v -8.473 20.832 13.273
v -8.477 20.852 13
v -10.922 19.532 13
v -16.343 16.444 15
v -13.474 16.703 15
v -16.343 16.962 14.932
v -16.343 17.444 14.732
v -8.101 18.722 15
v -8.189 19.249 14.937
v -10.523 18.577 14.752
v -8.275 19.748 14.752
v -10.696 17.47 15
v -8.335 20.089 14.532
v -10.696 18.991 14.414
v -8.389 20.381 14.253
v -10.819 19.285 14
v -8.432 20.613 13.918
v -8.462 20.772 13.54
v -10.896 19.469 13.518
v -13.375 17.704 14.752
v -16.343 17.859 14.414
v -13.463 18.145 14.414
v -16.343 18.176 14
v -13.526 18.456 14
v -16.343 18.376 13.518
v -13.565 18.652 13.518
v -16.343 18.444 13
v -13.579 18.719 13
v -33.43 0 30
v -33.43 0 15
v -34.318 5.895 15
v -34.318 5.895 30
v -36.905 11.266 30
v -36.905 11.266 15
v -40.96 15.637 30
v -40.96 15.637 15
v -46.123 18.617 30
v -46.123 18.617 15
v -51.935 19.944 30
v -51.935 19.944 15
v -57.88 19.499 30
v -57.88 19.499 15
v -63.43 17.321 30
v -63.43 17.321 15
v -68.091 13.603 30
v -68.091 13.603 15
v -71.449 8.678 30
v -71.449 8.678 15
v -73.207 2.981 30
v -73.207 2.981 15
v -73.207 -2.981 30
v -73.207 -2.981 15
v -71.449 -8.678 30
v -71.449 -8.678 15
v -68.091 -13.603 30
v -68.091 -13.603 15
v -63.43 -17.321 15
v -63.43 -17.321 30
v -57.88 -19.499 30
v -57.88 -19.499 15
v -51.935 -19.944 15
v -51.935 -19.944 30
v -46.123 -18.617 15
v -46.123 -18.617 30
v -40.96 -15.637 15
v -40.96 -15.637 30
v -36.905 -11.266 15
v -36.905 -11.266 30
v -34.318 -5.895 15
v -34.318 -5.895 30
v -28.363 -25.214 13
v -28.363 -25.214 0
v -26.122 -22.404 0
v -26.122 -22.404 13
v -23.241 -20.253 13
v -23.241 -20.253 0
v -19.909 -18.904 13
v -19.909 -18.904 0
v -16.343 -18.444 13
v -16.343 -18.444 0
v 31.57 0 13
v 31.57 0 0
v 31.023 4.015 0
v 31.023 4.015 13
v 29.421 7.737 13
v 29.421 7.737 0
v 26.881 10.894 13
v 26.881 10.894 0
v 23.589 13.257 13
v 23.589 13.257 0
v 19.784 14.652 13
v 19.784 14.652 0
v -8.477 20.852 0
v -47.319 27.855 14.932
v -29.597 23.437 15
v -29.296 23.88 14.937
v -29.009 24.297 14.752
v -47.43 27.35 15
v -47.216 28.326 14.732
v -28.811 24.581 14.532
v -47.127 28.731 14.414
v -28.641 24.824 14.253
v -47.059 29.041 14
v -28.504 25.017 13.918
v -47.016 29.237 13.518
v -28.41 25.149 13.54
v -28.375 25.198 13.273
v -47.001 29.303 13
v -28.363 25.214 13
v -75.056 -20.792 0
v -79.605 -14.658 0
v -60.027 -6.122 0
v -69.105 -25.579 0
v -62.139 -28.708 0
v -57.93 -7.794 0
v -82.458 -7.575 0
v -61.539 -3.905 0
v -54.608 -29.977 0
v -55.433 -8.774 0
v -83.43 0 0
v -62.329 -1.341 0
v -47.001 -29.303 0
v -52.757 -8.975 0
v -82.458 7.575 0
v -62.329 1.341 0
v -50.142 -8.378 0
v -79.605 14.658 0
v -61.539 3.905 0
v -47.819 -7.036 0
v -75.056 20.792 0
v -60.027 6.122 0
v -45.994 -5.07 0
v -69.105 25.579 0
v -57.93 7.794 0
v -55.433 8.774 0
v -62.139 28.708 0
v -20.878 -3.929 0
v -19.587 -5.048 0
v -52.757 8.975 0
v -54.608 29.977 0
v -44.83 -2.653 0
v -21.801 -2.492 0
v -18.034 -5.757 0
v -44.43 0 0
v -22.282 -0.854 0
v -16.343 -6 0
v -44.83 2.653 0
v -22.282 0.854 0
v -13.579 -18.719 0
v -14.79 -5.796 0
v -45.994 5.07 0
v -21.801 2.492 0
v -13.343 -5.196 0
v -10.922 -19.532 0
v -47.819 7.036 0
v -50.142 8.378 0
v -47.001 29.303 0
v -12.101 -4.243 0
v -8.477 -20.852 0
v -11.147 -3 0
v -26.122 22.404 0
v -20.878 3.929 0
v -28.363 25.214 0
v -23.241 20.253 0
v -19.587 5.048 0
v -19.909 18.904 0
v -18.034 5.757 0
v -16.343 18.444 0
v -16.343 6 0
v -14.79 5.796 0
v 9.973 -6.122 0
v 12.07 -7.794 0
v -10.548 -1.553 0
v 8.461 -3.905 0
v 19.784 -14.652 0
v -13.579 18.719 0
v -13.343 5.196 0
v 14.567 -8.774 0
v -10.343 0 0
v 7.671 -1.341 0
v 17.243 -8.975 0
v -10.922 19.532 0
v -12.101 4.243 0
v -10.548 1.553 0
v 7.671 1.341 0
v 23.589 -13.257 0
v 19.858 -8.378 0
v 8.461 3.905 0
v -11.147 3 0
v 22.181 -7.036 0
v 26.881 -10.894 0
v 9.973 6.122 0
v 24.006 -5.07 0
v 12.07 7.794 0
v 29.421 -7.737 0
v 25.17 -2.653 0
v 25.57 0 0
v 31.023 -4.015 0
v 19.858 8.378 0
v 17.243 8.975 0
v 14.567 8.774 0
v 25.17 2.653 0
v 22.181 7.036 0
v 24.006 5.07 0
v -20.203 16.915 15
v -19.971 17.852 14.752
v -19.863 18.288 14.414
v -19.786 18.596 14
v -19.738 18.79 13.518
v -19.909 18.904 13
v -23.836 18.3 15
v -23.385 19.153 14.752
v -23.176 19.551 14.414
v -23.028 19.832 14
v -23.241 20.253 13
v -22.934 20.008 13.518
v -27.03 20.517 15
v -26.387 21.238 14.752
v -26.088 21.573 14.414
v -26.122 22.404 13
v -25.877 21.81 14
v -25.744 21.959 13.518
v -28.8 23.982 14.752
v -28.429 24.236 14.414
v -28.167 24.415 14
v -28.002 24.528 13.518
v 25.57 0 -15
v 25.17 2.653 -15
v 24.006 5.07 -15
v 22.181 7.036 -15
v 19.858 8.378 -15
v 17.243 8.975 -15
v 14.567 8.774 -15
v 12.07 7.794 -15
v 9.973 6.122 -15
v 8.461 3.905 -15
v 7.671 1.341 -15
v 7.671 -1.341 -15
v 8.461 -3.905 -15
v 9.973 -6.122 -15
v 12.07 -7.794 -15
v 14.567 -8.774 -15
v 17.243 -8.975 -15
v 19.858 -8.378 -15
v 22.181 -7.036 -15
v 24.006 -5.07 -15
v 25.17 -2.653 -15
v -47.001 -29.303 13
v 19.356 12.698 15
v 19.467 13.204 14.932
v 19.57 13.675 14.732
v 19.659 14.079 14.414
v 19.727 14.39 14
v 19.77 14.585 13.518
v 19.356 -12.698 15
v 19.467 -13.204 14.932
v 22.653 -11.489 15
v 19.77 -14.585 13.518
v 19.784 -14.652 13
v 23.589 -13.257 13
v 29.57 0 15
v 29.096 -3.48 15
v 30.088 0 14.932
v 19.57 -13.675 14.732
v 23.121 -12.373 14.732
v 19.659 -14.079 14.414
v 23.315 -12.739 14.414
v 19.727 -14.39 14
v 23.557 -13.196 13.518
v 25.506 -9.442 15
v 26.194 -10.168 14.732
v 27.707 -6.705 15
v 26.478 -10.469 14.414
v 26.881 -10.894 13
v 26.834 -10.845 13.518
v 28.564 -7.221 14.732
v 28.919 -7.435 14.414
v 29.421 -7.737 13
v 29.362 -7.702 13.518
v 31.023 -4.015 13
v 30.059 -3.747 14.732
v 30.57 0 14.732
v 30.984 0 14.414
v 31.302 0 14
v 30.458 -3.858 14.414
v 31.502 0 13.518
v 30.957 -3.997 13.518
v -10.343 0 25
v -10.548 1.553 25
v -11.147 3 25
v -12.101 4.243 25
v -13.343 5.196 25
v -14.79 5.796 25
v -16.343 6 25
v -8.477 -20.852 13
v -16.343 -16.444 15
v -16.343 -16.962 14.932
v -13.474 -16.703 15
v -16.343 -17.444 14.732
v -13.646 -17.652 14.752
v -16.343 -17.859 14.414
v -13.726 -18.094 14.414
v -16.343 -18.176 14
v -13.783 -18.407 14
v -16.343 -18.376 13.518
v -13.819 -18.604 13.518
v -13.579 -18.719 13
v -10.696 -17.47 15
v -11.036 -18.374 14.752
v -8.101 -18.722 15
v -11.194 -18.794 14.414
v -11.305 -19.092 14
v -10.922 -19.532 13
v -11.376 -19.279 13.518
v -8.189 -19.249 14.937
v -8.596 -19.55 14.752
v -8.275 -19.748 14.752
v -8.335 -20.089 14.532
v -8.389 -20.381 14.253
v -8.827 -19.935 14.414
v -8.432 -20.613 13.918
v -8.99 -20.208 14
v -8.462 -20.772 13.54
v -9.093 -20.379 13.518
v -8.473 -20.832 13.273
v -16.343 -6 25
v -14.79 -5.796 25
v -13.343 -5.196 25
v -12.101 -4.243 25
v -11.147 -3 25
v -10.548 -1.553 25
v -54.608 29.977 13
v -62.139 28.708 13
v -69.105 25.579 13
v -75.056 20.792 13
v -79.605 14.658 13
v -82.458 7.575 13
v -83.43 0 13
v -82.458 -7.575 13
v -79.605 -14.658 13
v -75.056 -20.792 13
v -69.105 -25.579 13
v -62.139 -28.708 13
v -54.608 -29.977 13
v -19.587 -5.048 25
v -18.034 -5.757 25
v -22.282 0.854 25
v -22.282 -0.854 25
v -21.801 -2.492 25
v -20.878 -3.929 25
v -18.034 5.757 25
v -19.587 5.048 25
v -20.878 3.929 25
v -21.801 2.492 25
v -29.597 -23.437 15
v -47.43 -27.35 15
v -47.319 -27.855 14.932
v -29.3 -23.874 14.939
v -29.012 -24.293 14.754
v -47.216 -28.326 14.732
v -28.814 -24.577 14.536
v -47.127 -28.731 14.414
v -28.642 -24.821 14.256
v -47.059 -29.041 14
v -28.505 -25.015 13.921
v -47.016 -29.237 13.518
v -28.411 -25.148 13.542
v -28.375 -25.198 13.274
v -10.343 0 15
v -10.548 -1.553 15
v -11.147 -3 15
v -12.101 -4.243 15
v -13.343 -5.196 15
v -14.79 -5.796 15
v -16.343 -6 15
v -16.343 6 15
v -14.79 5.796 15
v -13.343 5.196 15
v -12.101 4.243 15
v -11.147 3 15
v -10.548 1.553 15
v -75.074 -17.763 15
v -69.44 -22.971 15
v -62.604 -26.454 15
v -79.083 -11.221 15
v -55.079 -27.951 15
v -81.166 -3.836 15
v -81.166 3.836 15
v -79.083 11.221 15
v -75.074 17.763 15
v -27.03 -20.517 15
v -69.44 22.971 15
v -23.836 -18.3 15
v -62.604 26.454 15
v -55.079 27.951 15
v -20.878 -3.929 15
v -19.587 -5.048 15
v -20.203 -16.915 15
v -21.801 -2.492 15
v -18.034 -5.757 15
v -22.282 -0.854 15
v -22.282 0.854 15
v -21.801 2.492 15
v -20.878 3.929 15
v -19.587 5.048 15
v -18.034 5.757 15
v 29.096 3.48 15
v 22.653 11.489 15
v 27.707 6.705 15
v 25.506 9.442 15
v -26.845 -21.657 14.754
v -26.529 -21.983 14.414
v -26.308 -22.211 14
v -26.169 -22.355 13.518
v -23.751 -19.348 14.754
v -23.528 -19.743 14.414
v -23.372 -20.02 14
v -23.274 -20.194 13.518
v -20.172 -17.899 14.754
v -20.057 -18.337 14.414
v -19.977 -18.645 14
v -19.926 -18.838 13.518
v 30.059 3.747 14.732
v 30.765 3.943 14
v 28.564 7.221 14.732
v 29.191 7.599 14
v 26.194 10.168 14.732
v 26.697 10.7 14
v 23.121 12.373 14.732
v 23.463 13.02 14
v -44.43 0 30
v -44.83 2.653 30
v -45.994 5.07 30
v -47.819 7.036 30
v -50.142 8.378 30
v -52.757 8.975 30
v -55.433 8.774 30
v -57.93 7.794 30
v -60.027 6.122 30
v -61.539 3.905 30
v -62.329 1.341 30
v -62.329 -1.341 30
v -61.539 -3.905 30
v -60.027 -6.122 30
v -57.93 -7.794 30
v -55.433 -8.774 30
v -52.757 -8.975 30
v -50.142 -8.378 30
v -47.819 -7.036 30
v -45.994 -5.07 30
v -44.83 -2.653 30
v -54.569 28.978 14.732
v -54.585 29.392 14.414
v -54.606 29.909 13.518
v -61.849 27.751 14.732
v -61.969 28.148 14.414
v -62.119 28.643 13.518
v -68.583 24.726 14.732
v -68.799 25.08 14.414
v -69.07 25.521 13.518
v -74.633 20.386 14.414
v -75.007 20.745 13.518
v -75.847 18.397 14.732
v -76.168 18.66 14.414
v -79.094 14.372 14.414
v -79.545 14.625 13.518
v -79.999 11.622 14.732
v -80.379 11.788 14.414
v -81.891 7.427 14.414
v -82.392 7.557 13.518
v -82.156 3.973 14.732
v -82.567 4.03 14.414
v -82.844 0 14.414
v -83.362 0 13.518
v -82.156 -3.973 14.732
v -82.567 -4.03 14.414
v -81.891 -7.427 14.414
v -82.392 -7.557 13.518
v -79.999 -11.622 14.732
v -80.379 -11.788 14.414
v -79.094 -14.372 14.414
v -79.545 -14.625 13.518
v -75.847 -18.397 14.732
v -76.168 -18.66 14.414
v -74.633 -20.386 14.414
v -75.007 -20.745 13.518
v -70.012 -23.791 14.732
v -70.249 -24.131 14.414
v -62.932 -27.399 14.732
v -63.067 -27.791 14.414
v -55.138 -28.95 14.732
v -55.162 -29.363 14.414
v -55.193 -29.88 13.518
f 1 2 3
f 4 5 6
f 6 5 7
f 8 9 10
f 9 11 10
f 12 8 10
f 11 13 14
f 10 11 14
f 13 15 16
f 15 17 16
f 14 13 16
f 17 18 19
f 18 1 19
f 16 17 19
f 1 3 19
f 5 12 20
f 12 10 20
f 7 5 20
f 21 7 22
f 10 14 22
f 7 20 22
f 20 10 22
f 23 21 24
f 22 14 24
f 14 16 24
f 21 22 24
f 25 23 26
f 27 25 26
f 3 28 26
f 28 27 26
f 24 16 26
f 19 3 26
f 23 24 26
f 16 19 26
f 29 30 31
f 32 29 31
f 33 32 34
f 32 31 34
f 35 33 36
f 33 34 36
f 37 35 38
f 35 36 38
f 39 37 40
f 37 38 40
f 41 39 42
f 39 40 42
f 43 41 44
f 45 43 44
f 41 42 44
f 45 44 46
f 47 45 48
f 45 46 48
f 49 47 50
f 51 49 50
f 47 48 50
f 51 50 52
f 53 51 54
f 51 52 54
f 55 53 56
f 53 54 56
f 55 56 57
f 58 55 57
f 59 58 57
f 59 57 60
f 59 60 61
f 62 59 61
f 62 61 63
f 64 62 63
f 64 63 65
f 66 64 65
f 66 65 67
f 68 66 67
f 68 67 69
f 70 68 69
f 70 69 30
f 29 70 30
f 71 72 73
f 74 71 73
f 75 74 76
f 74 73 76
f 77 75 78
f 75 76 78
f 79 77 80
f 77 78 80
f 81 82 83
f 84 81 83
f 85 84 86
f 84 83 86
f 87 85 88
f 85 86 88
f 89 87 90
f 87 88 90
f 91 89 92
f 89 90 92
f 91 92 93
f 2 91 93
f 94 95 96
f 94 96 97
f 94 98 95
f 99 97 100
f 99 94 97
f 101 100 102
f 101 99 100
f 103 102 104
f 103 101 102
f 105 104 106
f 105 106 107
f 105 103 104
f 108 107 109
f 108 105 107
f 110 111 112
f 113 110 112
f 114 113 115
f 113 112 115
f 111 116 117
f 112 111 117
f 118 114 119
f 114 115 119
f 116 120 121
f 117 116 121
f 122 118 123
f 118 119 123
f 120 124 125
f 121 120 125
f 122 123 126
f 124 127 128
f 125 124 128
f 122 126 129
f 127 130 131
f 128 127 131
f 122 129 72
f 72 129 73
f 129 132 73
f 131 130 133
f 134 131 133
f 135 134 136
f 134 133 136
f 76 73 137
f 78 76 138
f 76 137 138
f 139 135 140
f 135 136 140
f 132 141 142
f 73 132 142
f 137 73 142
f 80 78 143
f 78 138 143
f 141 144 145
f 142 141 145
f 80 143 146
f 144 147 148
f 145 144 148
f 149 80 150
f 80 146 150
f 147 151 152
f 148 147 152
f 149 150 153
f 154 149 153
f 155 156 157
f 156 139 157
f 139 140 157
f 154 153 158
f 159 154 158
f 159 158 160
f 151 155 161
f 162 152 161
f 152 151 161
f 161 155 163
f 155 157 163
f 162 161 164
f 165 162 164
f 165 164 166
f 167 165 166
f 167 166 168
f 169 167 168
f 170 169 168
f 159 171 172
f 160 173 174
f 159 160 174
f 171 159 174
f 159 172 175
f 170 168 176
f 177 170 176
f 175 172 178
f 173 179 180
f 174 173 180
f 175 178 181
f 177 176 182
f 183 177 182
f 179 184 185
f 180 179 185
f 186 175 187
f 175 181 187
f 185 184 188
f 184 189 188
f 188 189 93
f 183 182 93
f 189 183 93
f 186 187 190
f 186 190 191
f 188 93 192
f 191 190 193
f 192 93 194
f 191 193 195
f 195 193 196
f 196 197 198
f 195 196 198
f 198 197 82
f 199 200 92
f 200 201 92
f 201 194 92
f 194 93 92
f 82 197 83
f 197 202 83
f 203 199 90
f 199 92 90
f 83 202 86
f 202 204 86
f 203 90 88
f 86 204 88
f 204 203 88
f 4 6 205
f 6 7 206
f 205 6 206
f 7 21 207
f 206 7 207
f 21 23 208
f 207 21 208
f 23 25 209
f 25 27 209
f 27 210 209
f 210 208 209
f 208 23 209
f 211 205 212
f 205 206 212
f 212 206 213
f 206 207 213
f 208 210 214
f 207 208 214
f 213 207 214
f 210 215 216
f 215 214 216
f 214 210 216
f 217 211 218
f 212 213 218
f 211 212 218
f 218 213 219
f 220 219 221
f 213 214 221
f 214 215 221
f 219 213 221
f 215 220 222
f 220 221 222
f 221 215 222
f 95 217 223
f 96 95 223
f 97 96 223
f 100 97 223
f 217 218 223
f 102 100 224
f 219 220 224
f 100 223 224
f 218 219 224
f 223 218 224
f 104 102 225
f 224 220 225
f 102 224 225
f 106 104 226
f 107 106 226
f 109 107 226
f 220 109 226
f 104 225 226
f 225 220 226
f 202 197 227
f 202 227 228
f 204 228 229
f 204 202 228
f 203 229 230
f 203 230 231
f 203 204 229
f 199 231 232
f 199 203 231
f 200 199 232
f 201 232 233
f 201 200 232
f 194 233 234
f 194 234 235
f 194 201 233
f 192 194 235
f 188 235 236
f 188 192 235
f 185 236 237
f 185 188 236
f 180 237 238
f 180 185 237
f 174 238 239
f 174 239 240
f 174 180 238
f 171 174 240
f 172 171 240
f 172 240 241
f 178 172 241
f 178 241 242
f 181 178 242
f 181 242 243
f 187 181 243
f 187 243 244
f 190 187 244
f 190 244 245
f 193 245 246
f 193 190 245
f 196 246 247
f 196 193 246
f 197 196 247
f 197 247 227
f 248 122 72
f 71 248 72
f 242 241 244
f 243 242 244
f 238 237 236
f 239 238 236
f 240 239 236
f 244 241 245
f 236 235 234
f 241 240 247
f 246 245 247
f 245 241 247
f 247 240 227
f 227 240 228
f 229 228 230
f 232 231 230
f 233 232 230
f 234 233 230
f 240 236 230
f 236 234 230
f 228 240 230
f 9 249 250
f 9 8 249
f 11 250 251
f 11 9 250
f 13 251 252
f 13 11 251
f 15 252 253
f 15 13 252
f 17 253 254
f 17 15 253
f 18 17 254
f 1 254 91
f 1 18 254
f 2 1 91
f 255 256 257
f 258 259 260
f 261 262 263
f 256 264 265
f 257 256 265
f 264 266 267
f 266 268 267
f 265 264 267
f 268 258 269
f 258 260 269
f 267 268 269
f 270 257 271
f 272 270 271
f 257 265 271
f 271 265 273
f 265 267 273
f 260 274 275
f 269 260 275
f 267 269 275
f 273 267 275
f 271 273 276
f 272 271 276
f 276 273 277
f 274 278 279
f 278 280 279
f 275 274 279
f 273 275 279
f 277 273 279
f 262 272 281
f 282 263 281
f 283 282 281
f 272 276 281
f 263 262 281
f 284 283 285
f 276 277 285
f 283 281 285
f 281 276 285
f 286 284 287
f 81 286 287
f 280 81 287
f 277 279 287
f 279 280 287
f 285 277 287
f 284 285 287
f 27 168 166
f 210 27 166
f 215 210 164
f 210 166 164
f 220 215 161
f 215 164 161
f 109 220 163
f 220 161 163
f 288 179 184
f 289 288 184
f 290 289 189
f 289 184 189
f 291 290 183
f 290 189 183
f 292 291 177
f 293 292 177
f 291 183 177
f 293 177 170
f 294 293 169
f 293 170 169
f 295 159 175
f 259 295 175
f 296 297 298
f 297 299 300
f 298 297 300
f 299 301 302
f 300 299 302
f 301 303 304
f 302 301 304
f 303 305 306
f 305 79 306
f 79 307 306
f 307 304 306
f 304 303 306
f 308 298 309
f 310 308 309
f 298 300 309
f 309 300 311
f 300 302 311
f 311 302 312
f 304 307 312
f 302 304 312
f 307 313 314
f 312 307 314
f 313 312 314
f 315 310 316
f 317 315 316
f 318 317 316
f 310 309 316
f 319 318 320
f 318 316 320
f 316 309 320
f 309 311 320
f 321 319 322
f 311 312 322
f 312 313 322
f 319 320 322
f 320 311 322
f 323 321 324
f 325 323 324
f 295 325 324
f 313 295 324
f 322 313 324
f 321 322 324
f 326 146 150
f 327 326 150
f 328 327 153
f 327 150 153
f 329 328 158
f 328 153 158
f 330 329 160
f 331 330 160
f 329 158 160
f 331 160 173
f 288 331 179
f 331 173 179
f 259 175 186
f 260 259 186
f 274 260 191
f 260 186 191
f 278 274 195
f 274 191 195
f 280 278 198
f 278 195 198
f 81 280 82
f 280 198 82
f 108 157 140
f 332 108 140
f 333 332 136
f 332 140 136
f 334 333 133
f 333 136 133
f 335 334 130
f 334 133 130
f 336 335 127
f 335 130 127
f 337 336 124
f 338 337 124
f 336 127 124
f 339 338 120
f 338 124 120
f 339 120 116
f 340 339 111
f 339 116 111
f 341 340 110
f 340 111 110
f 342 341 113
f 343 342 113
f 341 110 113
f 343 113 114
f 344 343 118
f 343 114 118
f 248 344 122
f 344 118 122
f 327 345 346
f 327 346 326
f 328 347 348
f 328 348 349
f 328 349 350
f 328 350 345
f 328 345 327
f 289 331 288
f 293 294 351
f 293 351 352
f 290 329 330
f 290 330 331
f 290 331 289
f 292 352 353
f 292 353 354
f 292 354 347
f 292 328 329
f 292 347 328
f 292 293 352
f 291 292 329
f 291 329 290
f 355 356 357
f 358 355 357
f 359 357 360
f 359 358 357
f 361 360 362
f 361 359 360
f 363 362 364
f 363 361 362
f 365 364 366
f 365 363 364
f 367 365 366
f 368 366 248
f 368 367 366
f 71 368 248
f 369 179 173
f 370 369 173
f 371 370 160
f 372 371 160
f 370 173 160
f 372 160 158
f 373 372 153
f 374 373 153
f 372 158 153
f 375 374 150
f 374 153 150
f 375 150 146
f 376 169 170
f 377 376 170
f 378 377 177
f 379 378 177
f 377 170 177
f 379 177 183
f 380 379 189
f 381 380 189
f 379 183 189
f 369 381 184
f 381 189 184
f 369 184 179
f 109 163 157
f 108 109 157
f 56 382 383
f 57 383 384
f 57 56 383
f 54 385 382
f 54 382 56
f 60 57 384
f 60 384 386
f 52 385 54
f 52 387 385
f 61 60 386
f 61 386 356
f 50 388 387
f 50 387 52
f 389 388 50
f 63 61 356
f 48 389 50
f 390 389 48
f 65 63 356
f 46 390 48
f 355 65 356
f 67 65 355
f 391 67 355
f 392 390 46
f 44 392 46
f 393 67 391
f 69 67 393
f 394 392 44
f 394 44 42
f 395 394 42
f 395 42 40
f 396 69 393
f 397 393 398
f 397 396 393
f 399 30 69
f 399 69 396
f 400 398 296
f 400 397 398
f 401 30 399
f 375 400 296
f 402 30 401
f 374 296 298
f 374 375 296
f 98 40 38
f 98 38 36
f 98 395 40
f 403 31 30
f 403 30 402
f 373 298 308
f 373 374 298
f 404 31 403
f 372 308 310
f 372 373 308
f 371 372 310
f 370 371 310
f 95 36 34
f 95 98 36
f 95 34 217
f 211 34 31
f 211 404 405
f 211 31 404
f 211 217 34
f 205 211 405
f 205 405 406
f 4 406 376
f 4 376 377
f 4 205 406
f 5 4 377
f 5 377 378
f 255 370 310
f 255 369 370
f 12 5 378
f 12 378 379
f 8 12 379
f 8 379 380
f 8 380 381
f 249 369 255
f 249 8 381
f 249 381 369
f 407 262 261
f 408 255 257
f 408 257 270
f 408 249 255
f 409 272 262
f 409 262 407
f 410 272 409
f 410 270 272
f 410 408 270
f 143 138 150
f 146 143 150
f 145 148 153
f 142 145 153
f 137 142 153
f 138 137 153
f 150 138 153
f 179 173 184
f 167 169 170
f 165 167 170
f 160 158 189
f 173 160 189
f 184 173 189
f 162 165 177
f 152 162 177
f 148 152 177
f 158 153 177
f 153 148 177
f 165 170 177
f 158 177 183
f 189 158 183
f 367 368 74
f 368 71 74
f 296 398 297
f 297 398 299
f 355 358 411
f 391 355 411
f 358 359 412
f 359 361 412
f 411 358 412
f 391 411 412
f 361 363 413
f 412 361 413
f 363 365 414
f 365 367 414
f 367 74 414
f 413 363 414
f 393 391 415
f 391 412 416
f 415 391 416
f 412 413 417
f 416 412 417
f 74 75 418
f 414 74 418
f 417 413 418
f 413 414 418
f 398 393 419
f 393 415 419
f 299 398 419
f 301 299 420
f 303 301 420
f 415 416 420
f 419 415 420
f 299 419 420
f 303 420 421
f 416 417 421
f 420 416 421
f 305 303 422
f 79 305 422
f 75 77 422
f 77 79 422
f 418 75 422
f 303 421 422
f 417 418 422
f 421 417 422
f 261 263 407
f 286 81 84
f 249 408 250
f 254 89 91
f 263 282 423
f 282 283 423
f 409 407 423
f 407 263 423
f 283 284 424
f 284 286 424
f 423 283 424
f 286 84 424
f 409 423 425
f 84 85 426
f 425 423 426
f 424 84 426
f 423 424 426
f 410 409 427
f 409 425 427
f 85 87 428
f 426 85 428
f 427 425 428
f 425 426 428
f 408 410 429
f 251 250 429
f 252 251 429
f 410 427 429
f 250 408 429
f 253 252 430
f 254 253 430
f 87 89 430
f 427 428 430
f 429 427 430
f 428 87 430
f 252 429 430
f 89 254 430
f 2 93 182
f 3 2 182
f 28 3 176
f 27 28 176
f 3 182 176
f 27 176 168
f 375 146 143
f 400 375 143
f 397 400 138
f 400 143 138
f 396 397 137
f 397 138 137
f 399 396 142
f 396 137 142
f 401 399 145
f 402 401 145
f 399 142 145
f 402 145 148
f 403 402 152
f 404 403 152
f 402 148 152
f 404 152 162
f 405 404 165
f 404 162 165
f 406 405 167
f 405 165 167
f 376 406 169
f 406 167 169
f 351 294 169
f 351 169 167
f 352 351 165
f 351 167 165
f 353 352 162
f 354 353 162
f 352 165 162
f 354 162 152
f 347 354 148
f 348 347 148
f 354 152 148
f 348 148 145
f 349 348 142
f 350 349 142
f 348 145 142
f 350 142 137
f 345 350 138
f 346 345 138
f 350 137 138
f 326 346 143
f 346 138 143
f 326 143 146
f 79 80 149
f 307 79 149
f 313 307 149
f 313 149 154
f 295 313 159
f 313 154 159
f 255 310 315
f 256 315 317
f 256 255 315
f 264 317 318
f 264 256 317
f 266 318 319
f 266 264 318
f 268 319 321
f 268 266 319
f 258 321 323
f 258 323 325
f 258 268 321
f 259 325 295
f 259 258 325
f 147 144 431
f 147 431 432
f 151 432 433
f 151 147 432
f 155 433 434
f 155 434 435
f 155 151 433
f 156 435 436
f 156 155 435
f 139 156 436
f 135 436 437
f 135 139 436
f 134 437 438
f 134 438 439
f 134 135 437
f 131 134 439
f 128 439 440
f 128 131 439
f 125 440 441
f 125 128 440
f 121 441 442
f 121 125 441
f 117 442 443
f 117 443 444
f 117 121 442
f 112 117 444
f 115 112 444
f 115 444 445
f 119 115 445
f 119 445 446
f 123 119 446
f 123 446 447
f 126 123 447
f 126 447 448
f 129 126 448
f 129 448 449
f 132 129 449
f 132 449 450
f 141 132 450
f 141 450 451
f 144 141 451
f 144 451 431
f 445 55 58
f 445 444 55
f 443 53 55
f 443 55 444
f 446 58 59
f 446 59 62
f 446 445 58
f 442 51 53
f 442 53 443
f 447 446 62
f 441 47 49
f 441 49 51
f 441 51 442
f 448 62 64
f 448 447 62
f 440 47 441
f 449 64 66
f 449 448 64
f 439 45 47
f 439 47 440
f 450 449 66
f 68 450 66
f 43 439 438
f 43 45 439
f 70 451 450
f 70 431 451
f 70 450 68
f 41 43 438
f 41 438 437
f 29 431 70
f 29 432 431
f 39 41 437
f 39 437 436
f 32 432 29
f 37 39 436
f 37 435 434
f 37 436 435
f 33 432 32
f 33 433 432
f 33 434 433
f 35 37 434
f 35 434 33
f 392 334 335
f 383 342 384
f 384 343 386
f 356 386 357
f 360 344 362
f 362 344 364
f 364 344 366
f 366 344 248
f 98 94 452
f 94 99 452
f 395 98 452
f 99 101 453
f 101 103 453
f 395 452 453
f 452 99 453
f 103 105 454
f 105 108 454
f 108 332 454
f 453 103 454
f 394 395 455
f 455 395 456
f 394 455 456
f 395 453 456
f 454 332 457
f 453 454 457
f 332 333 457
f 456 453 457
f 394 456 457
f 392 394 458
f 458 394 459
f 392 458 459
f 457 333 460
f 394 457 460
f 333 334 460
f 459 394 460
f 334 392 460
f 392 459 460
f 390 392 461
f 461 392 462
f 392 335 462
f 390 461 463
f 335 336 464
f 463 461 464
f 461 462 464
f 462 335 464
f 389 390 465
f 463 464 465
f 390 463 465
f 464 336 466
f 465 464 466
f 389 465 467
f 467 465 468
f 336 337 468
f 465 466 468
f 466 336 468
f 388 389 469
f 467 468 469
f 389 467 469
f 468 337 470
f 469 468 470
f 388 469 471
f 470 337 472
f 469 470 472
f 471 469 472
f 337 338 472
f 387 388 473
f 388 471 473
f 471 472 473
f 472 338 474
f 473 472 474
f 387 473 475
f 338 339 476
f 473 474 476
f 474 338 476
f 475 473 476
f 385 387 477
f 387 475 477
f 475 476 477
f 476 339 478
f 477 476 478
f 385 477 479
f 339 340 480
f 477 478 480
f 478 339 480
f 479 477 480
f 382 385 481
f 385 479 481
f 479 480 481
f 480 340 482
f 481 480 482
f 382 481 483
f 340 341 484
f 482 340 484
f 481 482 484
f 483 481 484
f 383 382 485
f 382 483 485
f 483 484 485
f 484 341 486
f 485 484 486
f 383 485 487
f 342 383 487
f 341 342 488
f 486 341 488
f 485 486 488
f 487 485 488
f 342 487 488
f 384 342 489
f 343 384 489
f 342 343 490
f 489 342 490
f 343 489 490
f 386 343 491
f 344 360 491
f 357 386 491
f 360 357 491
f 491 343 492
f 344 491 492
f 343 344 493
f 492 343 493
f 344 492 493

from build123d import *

# Parameters (mm, degrees)
F0_R     = 20
F0_R_2   = 9
F1_DEPTH = 15
F2_DEPTH = 15
F3_DEPTH = 30
F4_R     = 2
F5_DEPTH = 25


with BuildPart() as f1:
    # F0 (on Top) → F1 (new body)
    with BuildSketch(Plane.XY):
        with BuildLine():
            ThreePointArc((-47.0013516621, -29.3031307097), (-30.0541114165, -18.8034951158), (-23.4299230907, 0))
            ThreePointArc((-23.4299230907, 0), (-30.0541114165, 18.8034951158), (-47.0013516621, 29.3031307097))
            ThreePointArc((-47.0013516621, 29.3031307097), (-83.4299230907, 0), (-47.0013516621, -29.3031307097))
        make_face()
        with Locations((-53.4299230907, 0)):
            Circle(F0_R, mode=Mode.SUBTRACT)
        with Locations((-53.4299230907, 0)):
            Circle(F0_R)
        with Locations((-53.4299230907, 0)):
            Circle(F0_R_2, mode=Mode.SUBTRACT)
        with BuildLine():
            ThreePointArc((-47.0013516621, 29.3031307097), (-30.0541114165, 18.8034951158), (-23.4299230907, 0))
            ThreePointArc((-23.4299230907, 0), (-30.0541114165, -18.8034951158), (-47.0013516621, -29.3031307097))
            Line((-47.0013516621, -29.3031307097), (-28.3632161226, -25.2142643425))
            ThreePointArc((-28.3632161226, -25.2142643425), (-23.240927988, -20.2532308731), (-16.3432708876, -18.4443595833))
            Line((-16.3432708876, -18.4443595833), (-16.3432708876, -6))
            ThreePointArc((-16.3432708876, -6), (-22.3432708876, 0), (-16.3432708876, 6))
            Line((-16.3432708876, 6), (-16.3432708876, 18.4443595833))
            ThreePointArc((-16.3432708876, 18.4443595833), (-23.240927988, 20.2532308731), (-28.3632161226, 25.2142643425))
            Line((-28.3632161226, 25.2142643425), (-47.0013516621, 29.3031307097))
        make_face()
        with BuildLine():
            ThreePointArc((-8.4771248069, 20.8516192817), (-12.2301469709, 19.0596414048), (-16.3432708876, 18.4443595833))
            Line((-16.3432708876, 18.4443595833), (-16.3432708876, 6))
            ThreePointArc((-16.3432708876, 6), (-12.1006302005, 4.2426406871), (-10.3432708876, 0))
            ThreePointArc((-10.3432708876, 0), (-12.1006302005, -4.2426406871), (-16.3432708876, -6))
            Line((-16.3432708876, -6), (-16.3432708876, -18.4443595833))
            ThreePointArc((-16.3432708876, -18.4443595833), (-12.2301469709, -19.0596414048), (-8.4771248069, -20.8516192817))
            Line((-8.4771248069, -20.8516192817), (19.7843626236, -14.6515653548))
            ThreePointArc((19.7843626236, -14.6515653548), (1.5700769093, 0), (19.7843626236, 14.6515653548))
            Line((19.7843626236, 14.6515653548), (-8.4771248069, 20.8516192817))
        make_face()
        with BuildLine():
            ThreePointArc((31.5700769093, 0), (28.2579827464, 9.4017475579), (19.7843626236, 14.6515653548))
            ThreePointArc((19.7843626236, 14.6515653548), (1.5700769093, 0), (19.7843626236, -14.6515653548))
            ThreePointArc((19.7843626236, -14.6515653548), (28.2579827464, -9.4017475579), (31.5700769093, 0))
        make_face()
        with Locations((16.5700769093, 0)):
            Circle(F0_R_2, mode=Mode.SUBTRACT)
        with Locations((16.5700769093, 0)):
            Circle(F0_R_2)
    extrude(amount=F1_DEPTH)

    # F0 (on Top) → F2 (join)
    with BuildSketch(Plane.XY):
        with Locations((16.5700769093, 0)):
            Circle(F0_R_2)
    extrude(amount=-F2_DEPTH)

    # F0 (on Top) → F3 (join)
    with BuildSketch(Plane.XY):
        with Locations((-53.4299230907, 0)):
            Circle(F0_R)
        with Locations((-53.4299230907, 0)):
            Circle(F0_R_2, mode=Mode.SUBTRACT)
    extrude(amount=F3_DEPTH)

    # F4
    f4_edges = [f1.edges().sort_by_distance(p)[0] for p in [
        (-83.429923, 0, 15),
        (-19.355194, -18.770858, 15),
        (-19.355194, 18.770858, 15),
        (5.653619, -17.751592, 15),
    ]]
    fillet(f4_edges, radius=F4_R)


with BuildPart() as f5:
    # F0 (on Top) → F5 (new body)
    with BuildSketch(Plane.XY):
        with BuildLine():
            Line((-16.3432708876, -6), (-16.3432708876, 6))
            ThreePointArc((-16.3432708876, 6), (-22.3432708876, 0), (-16.3432708876, -6))
        make_face()
        with BuildLine():
            ThreePointArc((-10.3432708876, 0), (-12.1006302005, 4.2426406871), (-16.3432708876, 6))
            Line((-16.3432708876, 6), (-16.3432708876, -6))
            ThreePointArc((-16.3432708876, -6), (-12.1006302005, -4.2426406871), (-10.3432708876, 0))
        make_face()
    extrude(amount=F5_DEPTH)


solid = Compound([f1.part, f5.part])
